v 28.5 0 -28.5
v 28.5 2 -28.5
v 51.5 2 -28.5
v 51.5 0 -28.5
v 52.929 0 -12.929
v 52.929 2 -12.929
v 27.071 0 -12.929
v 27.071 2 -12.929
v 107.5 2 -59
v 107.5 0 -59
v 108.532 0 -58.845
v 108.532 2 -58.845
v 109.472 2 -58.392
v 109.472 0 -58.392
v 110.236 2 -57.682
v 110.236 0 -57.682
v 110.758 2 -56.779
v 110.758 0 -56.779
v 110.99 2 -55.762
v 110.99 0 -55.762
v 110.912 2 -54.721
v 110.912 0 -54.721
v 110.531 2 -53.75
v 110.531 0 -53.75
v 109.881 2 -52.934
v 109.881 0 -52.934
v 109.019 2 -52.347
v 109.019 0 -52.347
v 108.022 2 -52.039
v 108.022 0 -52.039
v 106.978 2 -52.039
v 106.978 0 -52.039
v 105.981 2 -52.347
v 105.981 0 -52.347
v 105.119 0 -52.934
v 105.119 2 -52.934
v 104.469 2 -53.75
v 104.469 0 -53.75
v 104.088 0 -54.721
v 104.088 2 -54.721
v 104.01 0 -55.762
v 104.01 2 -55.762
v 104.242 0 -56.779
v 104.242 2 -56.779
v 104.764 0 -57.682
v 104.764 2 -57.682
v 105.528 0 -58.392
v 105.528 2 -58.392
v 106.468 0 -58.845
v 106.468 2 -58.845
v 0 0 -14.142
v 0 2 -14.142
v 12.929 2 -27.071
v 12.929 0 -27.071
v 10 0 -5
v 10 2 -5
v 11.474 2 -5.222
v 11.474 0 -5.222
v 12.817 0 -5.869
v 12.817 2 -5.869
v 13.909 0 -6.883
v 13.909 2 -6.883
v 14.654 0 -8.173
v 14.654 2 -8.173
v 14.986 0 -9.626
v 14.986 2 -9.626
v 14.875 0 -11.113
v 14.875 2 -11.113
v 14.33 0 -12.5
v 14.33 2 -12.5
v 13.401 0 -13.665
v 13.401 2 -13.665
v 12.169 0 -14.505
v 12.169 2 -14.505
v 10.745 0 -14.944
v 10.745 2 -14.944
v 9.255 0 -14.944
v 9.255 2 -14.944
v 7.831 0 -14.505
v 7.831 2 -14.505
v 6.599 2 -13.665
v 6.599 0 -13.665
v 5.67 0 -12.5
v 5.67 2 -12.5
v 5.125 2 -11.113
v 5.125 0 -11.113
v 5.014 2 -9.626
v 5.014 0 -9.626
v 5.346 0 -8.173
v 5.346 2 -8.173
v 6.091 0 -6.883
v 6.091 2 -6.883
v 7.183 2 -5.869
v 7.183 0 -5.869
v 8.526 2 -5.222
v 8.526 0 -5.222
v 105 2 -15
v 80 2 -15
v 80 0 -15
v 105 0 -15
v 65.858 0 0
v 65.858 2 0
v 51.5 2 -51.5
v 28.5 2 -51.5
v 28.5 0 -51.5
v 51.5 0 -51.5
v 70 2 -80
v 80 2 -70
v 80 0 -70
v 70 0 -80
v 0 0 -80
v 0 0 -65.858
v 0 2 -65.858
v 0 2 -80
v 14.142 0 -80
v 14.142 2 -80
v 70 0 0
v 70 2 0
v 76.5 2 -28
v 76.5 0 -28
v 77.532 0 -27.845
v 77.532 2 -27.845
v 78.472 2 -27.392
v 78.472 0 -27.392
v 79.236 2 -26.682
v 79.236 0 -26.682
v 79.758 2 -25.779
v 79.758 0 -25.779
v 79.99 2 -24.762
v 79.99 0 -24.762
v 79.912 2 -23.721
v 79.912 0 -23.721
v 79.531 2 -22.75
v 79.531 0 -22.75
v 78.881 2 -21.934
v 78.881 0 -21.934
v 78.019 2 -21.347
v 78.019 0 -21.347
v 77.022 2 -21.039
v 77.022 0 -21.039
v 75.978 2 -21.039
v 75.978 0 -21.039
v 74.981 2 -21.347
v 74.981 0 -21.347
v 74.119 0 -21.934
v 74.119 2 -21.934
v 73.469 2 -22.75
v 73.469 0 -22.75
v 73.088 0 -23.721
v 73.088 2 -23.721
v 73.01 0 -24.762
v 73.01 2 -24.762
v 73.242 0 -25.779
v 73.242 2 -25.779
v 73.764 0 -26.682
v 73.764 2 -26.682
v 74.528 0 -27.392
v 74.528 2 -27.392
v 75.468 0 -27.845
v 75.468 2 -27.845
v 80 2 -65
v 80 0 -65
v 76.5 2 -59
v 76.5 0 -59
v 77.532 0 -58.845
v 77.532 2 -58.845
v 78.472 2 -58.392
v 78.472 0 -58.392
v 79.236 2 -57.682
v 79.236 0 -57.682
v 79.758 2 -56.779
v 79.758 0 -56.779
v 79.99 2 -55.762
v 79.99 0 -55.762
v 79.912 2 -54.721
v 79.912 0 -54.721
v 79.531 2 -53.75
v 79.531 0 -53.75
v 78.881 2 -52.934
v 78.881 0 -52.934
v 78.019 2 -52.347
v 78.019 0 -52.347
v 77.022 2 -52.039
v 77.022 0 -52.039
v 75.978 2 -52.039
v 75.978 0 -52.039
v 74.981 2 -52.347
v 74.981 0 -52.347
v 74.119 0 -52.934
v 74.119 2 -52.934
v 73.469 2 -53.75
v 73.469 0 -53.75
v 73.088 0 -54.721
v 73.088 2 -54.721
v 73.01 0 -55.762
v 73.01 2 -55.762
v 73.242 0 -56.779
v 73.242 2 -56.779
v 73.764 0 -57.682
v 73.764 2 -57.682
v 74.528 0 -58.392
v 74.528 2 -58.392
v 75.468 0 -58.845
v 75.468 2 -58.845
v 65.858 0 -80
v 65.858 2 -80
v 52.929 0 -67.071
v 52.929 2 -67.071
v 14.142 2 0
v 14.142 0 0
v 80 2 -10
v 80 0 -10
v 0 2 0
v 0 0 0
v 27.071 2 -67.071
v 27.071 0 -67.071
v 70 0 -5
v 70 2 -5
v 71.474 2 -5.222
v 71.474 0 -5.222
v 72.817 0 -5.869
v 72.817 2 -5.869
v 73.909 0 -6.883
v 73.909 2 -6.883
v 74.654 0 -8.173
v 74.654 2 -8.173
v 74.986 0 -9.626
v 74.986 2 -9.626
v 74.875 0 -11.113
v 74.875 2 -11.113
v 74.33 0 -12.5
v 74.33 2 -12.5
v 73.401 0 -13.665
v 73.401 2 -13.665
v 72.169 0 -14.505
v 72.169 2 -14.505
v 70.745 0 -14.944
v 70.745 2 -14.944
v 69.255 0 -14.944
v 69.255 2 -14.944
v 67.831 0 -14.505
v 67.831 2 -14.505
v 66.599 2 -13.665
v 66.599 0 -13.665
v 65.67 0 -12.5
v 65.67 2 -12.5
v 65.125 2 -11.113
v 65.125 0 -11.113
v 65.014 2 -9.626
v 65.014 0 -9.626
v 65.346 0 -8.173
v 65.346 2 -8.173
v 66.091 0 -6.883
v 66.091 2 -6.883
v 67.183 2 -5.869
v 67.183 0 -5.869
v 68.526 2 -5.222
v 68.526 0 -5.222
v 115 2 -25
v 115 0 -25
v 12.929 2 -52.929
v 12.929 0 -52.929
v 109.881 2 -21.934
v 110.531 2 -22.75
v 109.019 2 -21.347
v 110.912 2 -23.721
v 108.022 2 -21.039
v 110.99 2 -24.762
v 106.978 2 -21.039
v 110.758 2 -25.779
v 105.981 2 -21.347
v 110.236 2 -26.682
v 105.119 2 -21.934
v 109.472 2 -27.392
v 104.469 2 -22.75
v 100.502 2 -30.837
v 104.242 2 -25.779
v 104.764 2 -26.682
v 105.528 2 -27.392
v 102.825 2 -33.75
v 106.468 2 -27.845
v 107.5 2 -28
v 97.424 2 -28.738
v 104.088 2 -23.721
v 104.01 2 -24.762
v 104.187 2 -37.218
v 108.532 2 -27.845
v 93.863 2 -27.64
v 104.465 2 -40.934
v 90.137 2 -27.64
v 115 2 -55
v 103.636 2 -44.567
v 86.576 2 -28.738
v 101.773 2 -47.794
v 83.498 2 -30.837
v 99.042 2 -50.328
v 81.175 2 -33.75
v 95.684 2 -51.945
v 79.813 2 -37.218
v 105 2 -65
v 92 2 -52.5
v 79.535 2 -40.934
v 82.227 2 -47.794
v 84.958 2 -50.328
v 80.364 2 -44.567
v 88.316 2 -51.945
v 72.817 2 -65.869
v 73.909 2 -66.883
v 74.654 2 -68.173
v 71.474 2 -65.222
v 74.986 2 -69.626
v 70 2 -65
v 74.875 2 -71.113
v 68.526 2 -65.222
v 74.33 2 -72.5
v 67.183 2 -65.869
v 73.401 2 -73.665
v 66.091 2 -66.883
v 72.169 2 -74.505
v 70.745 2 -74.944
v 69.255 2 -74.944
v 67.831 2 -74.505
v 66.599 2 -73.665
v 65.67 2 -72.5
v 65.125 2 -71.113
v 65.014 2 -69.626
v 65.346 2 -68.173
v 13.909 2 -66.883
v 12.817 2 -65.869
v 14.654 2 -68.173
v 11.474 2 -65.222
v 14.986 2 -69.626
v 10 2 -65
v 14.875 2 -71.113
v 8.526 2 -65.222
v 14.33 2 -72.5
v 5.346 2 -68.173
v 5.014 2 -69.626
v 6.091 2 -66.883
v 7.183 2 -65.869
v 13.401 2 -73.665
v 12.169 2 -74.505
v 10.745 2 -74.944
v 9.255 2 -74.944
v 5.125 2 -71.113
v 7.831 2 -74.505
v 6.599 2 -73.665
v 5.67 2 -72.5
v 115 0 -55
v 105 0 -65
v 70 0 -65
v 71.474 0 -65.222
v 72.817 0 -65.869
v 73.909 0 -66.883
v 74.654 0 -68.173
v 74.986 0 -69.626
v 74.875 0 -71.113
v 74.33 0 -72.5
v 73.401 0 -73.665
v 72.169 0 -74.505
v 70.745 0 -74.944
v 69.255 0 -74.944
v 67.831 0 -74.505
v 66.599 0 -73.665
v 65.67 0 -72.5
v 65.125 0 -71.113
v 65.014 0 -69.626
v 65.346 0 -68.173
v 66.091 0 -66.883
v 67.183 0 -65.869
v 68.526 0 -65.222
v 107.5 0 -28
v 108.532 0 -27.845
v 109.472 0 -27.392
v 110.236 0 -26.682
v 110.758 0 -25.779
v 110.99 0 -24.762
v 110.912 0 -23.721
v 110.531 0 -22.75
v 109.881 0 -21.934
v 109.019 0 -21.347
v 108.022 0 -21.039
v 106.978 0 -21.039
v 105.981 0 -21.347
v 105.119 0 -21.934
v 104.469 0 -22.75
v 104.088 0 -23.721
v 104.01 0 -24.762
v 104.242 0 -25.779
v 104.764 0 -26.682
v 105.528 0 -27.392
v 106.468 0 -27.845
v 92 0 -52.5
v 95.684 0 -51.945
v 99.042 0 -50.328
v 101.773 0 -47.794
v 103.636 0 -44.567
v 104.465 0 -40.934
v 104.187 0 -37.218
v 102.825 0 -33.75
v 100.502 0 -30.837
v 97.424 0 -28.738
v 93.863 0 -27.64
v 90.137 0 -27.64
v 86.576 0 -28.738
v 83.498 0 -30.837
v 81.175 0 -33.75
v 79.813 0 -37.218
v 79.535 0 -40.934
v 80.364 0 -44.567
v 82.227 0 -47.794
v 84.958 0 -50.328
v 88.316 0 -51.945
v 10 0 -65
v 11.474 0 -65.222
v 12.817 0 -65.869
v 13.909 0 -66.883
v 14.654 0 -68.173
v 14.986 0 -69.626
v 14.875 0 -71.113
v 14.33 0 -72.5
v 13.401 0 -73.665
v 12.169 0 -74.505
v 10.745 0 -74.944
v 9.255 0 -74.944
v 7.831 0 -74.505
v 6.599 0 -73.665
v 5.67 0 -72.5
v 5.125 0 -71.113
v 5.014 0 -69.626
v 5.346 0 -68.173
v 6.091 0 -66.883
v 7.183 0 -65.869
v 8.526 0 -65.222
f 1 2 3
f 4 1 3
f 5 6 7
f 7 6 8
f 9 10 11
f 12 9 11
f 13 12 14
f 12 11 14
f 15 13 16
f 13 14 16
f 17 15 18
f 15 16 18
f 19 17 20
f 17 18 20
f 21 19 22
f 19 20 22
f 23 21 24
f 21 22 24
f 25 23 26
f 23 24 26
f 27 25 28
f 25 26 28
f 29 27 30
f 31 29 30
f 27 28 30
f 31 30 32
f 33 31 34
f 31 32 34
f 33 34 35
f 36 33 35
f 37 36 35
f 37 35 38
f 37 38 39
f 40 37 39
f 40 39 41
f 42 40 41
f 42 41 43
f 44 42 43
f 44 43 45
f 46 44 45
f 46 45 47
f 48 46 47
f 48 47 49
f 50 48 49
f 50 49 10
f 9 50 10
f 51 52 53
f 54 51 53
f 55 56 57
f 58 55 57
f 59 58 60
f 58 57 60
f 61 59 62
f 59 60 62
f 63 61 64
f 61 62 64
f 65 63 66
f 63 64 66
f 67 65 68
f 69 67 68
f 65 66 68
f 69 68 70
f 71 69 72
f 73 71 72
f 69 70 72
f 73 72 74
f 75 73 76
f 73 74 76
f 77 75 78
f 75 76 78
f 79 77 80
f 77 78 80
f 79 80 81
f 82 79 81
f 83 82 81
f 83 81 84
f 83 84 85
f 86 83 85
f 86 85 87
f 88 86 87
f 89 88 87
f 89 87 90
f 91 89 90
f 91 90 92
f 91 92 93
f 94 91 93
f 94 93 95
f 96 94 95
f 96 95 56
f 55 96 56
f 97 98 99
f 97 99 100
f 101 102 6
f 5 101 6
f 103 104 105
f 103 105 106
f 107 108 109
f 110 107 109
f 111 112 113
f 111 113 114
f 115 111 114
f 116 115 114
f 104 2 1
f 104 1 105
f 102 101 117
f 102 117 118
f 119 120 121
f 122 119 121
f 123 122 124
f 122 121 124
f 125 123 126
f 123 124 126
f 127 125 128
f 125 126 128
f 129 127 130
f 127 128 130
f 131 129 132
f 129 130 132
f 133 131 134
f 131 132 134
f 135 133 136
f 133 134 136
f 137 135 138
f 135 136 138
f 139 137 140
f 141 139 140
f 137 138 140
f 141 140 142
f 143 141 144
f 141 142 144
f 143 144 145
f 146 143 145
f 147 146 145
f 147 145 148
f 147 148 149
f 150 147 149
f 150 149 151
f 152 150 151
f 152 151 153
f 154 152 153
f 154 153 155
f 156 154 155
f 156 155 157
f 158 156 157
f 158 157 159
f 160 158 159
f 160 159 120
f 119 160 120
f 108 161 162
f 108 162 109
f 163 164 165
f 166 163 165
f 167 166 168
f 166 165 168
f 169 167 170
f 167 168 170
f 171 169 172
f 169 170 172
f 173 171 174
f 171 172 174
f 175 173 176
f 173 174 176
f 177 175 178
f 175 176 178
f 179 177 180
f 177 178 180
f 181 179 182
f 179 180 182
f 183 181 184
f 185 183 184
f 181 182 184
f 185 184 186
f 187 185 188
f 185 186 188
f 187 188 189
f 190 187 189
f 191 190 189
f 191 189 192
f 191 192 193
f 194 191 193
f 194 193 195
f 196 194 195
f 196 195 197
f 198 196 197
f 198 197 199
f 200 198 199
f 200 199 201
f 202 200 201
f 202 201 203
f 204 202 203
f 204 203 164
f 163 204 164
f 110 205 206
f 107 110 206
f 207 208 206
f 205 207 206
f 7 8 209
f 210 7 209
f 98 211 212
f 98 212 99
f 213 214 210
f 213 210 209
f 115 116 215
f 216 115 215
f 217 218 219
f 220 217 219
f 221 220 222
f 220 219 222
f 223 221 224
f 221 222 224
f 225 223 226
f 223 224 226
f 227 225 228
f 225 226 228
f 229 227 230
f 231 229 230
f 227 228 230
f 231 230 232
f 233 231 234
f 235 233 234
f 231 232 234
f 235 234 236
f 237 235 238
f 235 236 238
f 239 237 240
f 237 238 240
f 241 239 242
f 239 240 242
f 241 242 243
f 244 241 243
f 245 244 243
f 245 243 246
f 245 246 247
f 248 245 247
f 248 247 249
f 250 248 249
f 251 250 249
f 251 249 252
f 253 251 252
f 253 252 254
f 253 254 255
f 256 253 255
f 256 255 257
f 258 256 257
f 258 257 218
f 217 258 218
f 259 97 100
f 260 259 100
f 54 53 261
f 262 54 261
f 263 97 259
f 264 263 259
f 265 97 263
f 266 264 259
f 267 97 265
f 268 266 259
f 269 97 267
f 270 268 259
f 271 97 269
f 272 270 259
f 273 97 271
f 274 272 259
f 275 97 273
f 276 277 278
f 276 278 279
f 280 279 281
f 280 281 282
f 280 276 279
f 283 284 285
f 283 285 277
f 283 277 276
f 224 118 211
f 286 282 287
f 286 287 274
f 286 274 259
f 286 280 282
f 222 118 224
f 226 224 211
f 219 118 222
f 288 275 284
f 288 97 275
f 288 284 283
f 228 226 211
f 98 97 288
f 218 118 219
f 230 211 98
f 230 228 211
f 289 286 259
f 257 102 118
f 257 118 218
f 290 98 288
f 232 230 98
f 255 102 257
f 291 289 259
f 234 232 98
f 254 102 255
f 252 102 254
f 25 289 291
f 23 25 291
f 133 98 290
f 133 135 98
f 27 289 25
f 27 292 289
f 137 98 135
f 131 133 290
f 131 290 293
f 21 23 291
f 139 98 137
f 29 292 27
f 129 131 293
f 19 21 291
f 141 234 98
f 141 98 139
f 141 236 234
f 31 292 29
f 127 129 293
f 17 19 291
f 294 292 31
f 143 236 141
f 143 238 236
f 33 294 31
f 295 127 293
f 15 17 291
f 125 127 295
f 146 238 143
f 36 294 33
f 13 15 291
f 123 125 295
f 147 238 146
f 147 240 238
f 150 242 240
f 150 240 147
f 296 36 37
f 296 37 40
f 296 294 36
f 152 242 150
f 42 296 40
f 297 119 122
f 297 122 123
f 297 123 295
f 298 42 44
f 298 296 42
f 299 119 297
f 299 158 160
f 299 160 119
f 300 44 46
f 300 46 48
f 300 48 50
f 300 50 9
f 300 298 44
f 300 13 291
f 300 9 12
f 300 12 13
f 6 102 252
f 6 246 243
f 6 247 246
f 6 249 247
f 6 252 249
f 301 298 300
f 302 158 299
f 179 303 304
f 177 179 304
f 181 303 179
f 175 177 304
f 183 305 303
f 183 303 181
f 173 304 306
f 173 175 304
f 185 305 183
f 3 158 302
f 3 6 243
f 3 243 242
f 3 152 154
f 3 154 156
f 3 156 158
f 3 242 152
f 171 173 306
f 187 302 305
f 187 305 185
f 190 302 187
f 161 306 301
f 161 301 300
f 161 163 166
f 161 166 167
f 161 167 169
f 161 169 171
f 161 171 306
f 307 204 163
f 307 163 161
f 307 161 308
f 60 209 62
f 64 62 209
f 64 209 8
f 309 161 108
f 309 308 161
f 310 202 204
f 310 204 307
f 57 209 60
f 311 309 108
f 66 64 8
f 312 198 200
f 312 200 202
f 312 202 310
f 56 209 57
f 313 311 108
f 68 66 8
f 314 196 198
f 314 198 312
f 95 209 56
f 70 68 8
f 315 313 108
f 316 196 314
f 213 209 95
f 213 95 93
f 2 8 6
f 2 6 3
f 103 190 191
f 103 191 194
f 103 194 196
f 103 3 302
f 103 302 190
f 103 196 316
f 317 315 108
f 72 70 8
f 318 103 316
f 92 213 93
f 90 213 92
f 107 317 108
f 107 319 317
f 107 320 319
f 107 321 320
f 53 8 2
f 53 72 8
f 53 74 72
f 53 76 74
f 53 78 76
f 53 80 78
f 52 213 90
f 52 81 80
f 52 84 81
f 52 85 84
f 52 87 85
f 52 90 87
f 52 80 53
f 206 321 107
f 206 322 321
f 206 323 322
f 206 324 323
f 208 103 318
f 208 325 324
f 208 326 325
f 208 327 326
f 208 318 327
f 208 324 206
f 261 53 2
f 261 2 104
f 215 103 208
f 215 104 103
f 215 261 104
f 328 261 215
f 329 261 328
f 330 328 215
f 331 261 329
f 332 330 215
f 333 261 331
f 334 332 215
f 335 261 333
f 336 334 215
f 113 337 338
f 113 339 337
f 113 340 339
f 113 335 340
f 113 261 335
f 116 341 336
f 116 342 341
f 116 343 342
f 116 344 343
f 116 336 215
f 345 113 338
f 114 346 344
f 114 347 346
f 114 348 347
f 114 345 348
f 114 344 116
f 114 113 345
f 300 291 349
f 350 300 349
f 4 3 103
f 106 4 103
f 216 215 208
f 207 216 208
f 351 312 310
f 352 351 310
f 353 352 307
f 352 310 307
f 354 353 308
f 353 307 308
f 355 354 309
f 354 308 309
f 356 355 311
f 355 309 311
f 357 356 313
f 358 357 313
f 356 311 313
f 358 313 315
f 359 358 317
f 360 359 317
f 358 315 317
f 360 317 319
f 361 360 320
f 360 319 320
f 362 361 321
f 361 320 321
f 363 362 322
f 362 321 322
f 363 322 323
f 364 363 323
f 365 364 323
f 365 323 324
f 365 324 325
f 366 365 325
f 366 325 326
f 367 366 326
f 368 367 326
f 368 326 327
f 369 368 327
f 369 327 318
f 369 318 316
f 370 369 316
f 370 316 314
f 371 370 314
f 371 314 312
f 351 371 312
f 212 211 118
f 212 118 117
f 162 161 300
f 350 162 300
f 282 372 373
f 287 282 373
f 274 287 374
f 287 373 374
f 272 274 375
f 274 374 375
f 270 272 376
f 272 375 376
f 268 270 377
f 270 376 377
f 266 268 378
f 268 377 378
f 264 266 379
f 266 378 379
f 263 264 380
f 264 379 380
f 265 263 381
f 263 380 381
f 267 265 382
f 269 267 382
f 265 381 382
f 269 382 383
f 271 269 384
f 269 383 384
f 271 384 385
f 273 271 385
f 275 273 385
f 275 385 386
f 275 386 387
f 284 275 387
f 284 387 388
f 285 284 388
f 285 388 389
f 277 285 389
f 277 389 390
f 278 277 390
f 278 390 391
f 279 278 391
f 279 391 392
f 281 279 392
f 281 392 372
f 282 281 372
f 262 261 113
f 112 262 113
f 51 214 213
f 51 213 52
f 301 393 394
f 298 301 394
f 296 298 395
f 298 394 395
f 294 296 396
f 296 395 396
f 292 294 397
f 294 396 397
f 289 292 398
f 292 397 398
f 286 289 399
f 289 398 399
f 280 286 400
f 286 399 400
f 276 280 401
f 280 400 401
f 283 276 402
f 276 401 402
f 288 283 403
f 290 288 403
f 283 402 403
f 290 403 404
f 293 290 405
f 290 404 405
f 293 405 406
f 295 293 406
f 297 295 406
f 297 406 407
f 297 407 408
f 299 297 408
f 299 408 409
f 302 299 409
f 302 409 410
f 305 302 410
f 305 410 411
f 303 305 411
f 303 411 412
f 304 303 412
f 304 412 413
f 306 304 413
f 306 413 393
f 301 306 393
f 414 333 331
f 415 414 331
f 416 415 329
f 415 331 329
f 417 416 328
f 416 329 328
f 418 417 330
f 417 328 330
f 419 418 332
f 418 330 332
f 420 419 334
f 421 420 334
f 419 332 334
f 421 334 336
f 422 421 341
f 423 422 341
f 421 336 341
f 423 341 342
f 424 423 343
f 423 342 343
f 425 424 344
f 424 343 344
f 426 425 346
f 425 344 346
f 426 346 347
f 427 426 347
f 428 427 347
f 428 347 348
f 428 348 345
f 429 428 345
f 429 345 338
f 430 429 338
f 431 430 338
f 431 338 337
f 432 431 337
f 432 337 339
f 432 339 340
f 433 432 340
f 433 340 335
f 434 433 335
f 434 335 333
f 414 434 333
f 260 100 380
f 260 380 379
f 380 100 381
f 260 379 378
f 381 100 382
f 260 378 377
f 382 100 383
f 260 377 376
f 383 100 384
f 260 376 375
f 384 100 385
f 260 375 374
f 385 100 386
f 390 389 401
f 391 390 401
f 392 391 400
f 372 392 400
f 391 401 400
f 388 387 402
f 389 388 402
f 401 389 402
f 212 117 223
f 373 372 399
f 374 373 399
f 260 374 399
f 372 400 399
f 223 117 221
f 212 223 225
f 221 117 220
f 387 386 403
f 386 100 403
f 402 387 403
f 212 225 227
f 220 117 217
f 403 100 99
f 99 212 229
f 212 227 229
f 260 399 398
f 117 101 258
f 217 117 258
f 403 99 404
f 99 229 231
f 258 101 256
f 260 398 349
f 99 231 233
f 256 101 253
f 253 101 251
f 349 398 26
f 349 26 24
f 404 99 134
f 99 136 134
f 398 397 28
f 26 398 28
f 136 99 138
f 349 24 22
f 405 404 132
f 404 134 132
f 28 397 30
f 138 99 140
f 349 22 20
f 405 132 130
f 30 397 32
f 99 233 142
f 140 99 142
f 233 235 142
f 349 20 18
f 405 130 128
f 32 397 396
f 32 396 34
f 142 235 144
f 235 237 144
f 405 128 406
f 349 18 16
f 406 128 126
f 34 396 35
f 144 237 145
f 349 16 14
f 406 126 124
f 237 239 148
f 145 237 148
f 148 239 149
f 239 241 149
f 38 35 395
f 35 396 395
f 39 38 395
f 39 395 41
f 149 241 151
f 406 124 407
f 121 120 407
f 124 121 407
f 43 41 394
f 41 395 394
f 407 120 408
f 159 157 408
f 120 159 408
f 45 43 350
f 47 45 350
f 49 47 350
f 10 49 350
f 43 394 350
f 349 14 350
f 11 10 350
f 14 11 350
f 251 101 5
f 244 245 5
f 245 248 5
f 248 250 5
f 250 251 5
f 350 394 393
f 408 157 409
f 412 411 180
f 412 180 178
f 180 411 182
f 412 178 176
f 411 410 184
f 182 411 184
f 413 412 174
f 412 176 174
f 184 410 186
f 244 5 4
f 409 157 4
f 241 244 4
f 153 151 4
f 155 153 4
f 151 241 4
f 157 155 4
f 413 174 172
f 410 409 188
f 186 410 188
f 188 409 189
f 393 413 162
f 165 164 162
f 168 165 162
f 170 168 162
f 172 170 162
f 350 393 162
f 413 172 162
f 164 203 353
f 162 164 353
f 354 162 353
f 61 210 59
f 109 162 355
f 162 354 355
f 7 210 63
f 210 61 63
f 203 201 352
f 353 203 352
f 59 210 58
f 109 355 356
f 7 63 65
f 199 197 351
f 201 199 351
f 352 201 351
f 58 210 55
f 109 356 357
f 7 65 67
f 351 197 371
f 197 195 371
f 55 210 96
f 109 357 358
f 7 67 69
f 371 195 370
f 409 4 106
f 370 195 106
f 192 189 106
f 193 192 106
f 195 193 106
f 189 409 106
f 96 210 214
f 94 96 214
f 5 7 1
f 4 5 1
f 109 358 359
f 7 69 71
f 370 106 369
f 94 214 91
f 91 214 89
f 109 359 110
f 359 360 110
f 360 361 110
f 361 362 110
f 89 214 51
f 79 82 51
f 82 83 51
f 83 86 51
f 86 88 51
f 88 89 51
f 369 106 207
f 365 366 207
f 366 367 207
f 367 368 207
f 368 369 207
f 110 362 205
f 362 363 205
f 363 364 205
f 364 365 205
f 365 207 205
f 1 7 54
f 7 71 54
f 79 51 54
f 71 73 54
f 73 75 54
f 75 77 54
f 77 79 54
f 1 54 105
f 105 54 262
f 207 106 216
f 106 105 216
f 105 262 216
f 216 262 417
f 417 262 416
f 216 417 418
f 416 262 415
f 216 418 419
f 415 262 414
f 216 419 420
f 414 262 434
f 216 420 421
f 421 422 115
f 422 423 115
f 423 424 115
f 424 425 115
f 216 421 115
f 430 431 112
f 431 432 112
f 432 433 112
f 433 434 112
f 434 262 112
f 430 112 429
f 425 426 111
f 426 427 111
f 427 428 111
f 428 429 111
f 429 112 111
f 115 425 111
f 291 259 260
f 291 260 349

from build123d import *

# Parameters (mm, degrees)
SKETCH1_W           = 80
SKETCH1_H           = 80
BOSS_EXTRUDE1_DEPTH = 2
SKETCH2_R           = 2.5
CUT_EXTRUDE1_DEPTH  = 10
SKETCH4_W           = 80
SKETCH4_H           = 2
BOSS_EXTRUDE2_DEPTH = 35
SKETCH3_R           = 1.5
SKETCH3_R_2         = 12.5
CUT_EXTRUDE2_DEPTH  = 10
SKETCH5_W           = 23
SKETCH5_H           = 23
CUT_EXTRUDE3_DEPTH  = 10
SKETCH6_W           = 35
SKETCH6_H           = 15
CUT_EXTRUDE4_DEPTH  = 10
CHAMFER1_SIZE       = 10
SKETCH7_R           = 5
CUT_EXTRUDE5_DEPTH  = 4
SKETCH8_R           = 3.5
CUT_EXTRUDE6_DEPTH  = 3


with BuildPart() as part:
    # Sketch1 → Boss-Extrude1 (new body)
    with BuildSketch(Plane(origin=(0, 0, 0), x_dir=(1, 0, 0), z_dir=(0, 1, 0))):
        with Locations((40, 40)):
            Rectangle(SKETCH1_W, SKETCH1_H)
    extrude(amount=BOSS_EXTRUDE1_DEPTH)

    # Sketch2 → Cut-Extrude1 (cut)
    with BuildSketch(Plane.XZ):
        with Locations(Location((70, -70, 0), (0, 0, 270))):
            Circle(SKETCH2_R)
        with Locations(Location((70, -10, 0), (0, 0, 270))):
            Circle(SKETCH2_R)
        with Locations(Location((10, -10, 0), (0, 0, 270))):
            Circle(SKETCH2_R)
        with Locations(Location((10, -70, 0), (0, 0, 270))):
            Circle(SKETCH2_R)
    extrude(amount=-CUT_EXTRUDE1_DEPTH, mode=Mode.SUBTRACT)

    # Sketch4 → Boss-Extrude2 (add)
    with BuildSketch(Plane(origin=(80, 0, 0), x_dir=(0, 0, -1), z_dir=(1, 0, 0))):
        with Locations((40, 1)):
            Rectangle(SKETCH4_W, SKETCH4_H)
    extrude(amount=BOSS_EXTRUDE2_DEPTH)

    # Sketch3 → Cut-Extrude2 (cut)
    with BuildSketch(Plane.XZ):
        with Locations(Location((107.5, -24.5, 0), (0, 0, 270))):
            Circle(SKETCH3_R)
        with Locations(Location((107.5, -55.5, 0), (0, 0, 270))):
            Circle(SKETCH3_R)
        with Locations(Location((76.5, -55.5, 0), (0, 0, 270))):
            Circle(SKETCH3_R)
        with Locations(Location((76.5, -24.5, 0), (0, 0, 270))):
            Circle(SKETCH3_R)
        with Locations(Location((92, -40, 0), (0, 0, 270))):
            Circle(SKETCH3_R_2)
    extrude(amount=-CUT_EXTRUDE2_DEPTH, mode=Mode.SUBTRACT)

    # Sketch5 → Cut-Extrude3 (cut)
    with BuildSketch(Plane(origin=(0, 2, 0), x_dir=(1, 0, 0), z_dir=(0, 1, 0))):
        Polygon((65.857864376, 80), (14.142135624, 80), (27.071067812, 67.071067812), (52.928932188, 67.071067812), align=None)
        with Locations((40, 40)):
            Rectangle(SKETCH5_W, SKETCH5_H)
        Polygon((27.071067812, 12.928932188), (14.142135624, 0), (65.857864376, 0), (52.928932188, 12.928932188), align=None)
        Polygon((12.928932188, 52.928932188), (0, 65.857864376), (0, 14.142135624), (12.928932188, 27.071067812), align=None)
    extrude(amount=-CUT_EXTRUDE3_DEPTH, mode=Mode.SUBTRACT)

    # Sketch6 → Cut-Extrude4 (cut)
    with BuildSketch(Plane(origin=(0, 2, 0), x_dir=(1, 0, 0), z_dir=(0, 1, 0))):
        with Locations((97.5, 72.5)):
            Rectangle(SKETCH6_W, SKETCH6_H)
        with Locations((97.5, 7.5)):
            Rectangle(SKETCH6_W, SKETCH6_H)
    extrude(amount=-CUT_EXTRUDE4_DEPTH, mode=Mode.SUBTRACT)

    # Chamfer1
    chamfer1_edges = [part.edges().sort_by_distance(p)[0] for p in [
        (115, 1, -15),
        (115, 1, -65),
        (80, 1, -80),
        (80, 1, 0),
    ]]
    chamfer(chamfer1_edges, length=CHAMFER1_SIZE)

    # Sketch7 → Cut-Extrude5 (cut)
    with BuildSketch(Plane(origin=(0, 2, 0), x_dir=(1, 0, 0), z_dir=(0, 1, 0))):
        with Locations(Location((70, 70, 0), (0, 0, 270))):
            Circle(SKETCH7_R)
        with Locations(Location((70, 10, 0), (0, 0, 270))):
            Circle(SKETCH7_R)
        with Locations(Location((10, 10, 0), (0, 0, 270))):
            Circle(SKETCH7_R)
        with Locations(Location((10, 70, 0), (0, 0, 270))):
            Circle(SKETCH7_R)
    extrude(amount=-CUT_EXTRUDE5_DEPTH, mode=Mode.SUBTRACT)

    # Sketch8 → Cut-Extrude6 (cut)
    with BuildSketch(Plane.XZ):
        with Locations(Location((107.5, -24.5, 0), (0, 0, 270))):
            Circle(SKETCH8_R)
        with Locations(Location((107.5, -55.5, 0), (0, 0, 270))):
            Circle(SKETCH8_R)
        with Locations(Location((76.5, -55.5, 0), (0, 0, 270))):
            Circle(SKETCH8_R)
        with Locations(Location((76.5, -24.5, 0), (0, 0, 270))):
            Circle(SKETCH8_R)
    extrude(amount=-CUT_EXTRUDE6_DEPTH, mode=Mode.SUBTRACT)


solid = part.part
